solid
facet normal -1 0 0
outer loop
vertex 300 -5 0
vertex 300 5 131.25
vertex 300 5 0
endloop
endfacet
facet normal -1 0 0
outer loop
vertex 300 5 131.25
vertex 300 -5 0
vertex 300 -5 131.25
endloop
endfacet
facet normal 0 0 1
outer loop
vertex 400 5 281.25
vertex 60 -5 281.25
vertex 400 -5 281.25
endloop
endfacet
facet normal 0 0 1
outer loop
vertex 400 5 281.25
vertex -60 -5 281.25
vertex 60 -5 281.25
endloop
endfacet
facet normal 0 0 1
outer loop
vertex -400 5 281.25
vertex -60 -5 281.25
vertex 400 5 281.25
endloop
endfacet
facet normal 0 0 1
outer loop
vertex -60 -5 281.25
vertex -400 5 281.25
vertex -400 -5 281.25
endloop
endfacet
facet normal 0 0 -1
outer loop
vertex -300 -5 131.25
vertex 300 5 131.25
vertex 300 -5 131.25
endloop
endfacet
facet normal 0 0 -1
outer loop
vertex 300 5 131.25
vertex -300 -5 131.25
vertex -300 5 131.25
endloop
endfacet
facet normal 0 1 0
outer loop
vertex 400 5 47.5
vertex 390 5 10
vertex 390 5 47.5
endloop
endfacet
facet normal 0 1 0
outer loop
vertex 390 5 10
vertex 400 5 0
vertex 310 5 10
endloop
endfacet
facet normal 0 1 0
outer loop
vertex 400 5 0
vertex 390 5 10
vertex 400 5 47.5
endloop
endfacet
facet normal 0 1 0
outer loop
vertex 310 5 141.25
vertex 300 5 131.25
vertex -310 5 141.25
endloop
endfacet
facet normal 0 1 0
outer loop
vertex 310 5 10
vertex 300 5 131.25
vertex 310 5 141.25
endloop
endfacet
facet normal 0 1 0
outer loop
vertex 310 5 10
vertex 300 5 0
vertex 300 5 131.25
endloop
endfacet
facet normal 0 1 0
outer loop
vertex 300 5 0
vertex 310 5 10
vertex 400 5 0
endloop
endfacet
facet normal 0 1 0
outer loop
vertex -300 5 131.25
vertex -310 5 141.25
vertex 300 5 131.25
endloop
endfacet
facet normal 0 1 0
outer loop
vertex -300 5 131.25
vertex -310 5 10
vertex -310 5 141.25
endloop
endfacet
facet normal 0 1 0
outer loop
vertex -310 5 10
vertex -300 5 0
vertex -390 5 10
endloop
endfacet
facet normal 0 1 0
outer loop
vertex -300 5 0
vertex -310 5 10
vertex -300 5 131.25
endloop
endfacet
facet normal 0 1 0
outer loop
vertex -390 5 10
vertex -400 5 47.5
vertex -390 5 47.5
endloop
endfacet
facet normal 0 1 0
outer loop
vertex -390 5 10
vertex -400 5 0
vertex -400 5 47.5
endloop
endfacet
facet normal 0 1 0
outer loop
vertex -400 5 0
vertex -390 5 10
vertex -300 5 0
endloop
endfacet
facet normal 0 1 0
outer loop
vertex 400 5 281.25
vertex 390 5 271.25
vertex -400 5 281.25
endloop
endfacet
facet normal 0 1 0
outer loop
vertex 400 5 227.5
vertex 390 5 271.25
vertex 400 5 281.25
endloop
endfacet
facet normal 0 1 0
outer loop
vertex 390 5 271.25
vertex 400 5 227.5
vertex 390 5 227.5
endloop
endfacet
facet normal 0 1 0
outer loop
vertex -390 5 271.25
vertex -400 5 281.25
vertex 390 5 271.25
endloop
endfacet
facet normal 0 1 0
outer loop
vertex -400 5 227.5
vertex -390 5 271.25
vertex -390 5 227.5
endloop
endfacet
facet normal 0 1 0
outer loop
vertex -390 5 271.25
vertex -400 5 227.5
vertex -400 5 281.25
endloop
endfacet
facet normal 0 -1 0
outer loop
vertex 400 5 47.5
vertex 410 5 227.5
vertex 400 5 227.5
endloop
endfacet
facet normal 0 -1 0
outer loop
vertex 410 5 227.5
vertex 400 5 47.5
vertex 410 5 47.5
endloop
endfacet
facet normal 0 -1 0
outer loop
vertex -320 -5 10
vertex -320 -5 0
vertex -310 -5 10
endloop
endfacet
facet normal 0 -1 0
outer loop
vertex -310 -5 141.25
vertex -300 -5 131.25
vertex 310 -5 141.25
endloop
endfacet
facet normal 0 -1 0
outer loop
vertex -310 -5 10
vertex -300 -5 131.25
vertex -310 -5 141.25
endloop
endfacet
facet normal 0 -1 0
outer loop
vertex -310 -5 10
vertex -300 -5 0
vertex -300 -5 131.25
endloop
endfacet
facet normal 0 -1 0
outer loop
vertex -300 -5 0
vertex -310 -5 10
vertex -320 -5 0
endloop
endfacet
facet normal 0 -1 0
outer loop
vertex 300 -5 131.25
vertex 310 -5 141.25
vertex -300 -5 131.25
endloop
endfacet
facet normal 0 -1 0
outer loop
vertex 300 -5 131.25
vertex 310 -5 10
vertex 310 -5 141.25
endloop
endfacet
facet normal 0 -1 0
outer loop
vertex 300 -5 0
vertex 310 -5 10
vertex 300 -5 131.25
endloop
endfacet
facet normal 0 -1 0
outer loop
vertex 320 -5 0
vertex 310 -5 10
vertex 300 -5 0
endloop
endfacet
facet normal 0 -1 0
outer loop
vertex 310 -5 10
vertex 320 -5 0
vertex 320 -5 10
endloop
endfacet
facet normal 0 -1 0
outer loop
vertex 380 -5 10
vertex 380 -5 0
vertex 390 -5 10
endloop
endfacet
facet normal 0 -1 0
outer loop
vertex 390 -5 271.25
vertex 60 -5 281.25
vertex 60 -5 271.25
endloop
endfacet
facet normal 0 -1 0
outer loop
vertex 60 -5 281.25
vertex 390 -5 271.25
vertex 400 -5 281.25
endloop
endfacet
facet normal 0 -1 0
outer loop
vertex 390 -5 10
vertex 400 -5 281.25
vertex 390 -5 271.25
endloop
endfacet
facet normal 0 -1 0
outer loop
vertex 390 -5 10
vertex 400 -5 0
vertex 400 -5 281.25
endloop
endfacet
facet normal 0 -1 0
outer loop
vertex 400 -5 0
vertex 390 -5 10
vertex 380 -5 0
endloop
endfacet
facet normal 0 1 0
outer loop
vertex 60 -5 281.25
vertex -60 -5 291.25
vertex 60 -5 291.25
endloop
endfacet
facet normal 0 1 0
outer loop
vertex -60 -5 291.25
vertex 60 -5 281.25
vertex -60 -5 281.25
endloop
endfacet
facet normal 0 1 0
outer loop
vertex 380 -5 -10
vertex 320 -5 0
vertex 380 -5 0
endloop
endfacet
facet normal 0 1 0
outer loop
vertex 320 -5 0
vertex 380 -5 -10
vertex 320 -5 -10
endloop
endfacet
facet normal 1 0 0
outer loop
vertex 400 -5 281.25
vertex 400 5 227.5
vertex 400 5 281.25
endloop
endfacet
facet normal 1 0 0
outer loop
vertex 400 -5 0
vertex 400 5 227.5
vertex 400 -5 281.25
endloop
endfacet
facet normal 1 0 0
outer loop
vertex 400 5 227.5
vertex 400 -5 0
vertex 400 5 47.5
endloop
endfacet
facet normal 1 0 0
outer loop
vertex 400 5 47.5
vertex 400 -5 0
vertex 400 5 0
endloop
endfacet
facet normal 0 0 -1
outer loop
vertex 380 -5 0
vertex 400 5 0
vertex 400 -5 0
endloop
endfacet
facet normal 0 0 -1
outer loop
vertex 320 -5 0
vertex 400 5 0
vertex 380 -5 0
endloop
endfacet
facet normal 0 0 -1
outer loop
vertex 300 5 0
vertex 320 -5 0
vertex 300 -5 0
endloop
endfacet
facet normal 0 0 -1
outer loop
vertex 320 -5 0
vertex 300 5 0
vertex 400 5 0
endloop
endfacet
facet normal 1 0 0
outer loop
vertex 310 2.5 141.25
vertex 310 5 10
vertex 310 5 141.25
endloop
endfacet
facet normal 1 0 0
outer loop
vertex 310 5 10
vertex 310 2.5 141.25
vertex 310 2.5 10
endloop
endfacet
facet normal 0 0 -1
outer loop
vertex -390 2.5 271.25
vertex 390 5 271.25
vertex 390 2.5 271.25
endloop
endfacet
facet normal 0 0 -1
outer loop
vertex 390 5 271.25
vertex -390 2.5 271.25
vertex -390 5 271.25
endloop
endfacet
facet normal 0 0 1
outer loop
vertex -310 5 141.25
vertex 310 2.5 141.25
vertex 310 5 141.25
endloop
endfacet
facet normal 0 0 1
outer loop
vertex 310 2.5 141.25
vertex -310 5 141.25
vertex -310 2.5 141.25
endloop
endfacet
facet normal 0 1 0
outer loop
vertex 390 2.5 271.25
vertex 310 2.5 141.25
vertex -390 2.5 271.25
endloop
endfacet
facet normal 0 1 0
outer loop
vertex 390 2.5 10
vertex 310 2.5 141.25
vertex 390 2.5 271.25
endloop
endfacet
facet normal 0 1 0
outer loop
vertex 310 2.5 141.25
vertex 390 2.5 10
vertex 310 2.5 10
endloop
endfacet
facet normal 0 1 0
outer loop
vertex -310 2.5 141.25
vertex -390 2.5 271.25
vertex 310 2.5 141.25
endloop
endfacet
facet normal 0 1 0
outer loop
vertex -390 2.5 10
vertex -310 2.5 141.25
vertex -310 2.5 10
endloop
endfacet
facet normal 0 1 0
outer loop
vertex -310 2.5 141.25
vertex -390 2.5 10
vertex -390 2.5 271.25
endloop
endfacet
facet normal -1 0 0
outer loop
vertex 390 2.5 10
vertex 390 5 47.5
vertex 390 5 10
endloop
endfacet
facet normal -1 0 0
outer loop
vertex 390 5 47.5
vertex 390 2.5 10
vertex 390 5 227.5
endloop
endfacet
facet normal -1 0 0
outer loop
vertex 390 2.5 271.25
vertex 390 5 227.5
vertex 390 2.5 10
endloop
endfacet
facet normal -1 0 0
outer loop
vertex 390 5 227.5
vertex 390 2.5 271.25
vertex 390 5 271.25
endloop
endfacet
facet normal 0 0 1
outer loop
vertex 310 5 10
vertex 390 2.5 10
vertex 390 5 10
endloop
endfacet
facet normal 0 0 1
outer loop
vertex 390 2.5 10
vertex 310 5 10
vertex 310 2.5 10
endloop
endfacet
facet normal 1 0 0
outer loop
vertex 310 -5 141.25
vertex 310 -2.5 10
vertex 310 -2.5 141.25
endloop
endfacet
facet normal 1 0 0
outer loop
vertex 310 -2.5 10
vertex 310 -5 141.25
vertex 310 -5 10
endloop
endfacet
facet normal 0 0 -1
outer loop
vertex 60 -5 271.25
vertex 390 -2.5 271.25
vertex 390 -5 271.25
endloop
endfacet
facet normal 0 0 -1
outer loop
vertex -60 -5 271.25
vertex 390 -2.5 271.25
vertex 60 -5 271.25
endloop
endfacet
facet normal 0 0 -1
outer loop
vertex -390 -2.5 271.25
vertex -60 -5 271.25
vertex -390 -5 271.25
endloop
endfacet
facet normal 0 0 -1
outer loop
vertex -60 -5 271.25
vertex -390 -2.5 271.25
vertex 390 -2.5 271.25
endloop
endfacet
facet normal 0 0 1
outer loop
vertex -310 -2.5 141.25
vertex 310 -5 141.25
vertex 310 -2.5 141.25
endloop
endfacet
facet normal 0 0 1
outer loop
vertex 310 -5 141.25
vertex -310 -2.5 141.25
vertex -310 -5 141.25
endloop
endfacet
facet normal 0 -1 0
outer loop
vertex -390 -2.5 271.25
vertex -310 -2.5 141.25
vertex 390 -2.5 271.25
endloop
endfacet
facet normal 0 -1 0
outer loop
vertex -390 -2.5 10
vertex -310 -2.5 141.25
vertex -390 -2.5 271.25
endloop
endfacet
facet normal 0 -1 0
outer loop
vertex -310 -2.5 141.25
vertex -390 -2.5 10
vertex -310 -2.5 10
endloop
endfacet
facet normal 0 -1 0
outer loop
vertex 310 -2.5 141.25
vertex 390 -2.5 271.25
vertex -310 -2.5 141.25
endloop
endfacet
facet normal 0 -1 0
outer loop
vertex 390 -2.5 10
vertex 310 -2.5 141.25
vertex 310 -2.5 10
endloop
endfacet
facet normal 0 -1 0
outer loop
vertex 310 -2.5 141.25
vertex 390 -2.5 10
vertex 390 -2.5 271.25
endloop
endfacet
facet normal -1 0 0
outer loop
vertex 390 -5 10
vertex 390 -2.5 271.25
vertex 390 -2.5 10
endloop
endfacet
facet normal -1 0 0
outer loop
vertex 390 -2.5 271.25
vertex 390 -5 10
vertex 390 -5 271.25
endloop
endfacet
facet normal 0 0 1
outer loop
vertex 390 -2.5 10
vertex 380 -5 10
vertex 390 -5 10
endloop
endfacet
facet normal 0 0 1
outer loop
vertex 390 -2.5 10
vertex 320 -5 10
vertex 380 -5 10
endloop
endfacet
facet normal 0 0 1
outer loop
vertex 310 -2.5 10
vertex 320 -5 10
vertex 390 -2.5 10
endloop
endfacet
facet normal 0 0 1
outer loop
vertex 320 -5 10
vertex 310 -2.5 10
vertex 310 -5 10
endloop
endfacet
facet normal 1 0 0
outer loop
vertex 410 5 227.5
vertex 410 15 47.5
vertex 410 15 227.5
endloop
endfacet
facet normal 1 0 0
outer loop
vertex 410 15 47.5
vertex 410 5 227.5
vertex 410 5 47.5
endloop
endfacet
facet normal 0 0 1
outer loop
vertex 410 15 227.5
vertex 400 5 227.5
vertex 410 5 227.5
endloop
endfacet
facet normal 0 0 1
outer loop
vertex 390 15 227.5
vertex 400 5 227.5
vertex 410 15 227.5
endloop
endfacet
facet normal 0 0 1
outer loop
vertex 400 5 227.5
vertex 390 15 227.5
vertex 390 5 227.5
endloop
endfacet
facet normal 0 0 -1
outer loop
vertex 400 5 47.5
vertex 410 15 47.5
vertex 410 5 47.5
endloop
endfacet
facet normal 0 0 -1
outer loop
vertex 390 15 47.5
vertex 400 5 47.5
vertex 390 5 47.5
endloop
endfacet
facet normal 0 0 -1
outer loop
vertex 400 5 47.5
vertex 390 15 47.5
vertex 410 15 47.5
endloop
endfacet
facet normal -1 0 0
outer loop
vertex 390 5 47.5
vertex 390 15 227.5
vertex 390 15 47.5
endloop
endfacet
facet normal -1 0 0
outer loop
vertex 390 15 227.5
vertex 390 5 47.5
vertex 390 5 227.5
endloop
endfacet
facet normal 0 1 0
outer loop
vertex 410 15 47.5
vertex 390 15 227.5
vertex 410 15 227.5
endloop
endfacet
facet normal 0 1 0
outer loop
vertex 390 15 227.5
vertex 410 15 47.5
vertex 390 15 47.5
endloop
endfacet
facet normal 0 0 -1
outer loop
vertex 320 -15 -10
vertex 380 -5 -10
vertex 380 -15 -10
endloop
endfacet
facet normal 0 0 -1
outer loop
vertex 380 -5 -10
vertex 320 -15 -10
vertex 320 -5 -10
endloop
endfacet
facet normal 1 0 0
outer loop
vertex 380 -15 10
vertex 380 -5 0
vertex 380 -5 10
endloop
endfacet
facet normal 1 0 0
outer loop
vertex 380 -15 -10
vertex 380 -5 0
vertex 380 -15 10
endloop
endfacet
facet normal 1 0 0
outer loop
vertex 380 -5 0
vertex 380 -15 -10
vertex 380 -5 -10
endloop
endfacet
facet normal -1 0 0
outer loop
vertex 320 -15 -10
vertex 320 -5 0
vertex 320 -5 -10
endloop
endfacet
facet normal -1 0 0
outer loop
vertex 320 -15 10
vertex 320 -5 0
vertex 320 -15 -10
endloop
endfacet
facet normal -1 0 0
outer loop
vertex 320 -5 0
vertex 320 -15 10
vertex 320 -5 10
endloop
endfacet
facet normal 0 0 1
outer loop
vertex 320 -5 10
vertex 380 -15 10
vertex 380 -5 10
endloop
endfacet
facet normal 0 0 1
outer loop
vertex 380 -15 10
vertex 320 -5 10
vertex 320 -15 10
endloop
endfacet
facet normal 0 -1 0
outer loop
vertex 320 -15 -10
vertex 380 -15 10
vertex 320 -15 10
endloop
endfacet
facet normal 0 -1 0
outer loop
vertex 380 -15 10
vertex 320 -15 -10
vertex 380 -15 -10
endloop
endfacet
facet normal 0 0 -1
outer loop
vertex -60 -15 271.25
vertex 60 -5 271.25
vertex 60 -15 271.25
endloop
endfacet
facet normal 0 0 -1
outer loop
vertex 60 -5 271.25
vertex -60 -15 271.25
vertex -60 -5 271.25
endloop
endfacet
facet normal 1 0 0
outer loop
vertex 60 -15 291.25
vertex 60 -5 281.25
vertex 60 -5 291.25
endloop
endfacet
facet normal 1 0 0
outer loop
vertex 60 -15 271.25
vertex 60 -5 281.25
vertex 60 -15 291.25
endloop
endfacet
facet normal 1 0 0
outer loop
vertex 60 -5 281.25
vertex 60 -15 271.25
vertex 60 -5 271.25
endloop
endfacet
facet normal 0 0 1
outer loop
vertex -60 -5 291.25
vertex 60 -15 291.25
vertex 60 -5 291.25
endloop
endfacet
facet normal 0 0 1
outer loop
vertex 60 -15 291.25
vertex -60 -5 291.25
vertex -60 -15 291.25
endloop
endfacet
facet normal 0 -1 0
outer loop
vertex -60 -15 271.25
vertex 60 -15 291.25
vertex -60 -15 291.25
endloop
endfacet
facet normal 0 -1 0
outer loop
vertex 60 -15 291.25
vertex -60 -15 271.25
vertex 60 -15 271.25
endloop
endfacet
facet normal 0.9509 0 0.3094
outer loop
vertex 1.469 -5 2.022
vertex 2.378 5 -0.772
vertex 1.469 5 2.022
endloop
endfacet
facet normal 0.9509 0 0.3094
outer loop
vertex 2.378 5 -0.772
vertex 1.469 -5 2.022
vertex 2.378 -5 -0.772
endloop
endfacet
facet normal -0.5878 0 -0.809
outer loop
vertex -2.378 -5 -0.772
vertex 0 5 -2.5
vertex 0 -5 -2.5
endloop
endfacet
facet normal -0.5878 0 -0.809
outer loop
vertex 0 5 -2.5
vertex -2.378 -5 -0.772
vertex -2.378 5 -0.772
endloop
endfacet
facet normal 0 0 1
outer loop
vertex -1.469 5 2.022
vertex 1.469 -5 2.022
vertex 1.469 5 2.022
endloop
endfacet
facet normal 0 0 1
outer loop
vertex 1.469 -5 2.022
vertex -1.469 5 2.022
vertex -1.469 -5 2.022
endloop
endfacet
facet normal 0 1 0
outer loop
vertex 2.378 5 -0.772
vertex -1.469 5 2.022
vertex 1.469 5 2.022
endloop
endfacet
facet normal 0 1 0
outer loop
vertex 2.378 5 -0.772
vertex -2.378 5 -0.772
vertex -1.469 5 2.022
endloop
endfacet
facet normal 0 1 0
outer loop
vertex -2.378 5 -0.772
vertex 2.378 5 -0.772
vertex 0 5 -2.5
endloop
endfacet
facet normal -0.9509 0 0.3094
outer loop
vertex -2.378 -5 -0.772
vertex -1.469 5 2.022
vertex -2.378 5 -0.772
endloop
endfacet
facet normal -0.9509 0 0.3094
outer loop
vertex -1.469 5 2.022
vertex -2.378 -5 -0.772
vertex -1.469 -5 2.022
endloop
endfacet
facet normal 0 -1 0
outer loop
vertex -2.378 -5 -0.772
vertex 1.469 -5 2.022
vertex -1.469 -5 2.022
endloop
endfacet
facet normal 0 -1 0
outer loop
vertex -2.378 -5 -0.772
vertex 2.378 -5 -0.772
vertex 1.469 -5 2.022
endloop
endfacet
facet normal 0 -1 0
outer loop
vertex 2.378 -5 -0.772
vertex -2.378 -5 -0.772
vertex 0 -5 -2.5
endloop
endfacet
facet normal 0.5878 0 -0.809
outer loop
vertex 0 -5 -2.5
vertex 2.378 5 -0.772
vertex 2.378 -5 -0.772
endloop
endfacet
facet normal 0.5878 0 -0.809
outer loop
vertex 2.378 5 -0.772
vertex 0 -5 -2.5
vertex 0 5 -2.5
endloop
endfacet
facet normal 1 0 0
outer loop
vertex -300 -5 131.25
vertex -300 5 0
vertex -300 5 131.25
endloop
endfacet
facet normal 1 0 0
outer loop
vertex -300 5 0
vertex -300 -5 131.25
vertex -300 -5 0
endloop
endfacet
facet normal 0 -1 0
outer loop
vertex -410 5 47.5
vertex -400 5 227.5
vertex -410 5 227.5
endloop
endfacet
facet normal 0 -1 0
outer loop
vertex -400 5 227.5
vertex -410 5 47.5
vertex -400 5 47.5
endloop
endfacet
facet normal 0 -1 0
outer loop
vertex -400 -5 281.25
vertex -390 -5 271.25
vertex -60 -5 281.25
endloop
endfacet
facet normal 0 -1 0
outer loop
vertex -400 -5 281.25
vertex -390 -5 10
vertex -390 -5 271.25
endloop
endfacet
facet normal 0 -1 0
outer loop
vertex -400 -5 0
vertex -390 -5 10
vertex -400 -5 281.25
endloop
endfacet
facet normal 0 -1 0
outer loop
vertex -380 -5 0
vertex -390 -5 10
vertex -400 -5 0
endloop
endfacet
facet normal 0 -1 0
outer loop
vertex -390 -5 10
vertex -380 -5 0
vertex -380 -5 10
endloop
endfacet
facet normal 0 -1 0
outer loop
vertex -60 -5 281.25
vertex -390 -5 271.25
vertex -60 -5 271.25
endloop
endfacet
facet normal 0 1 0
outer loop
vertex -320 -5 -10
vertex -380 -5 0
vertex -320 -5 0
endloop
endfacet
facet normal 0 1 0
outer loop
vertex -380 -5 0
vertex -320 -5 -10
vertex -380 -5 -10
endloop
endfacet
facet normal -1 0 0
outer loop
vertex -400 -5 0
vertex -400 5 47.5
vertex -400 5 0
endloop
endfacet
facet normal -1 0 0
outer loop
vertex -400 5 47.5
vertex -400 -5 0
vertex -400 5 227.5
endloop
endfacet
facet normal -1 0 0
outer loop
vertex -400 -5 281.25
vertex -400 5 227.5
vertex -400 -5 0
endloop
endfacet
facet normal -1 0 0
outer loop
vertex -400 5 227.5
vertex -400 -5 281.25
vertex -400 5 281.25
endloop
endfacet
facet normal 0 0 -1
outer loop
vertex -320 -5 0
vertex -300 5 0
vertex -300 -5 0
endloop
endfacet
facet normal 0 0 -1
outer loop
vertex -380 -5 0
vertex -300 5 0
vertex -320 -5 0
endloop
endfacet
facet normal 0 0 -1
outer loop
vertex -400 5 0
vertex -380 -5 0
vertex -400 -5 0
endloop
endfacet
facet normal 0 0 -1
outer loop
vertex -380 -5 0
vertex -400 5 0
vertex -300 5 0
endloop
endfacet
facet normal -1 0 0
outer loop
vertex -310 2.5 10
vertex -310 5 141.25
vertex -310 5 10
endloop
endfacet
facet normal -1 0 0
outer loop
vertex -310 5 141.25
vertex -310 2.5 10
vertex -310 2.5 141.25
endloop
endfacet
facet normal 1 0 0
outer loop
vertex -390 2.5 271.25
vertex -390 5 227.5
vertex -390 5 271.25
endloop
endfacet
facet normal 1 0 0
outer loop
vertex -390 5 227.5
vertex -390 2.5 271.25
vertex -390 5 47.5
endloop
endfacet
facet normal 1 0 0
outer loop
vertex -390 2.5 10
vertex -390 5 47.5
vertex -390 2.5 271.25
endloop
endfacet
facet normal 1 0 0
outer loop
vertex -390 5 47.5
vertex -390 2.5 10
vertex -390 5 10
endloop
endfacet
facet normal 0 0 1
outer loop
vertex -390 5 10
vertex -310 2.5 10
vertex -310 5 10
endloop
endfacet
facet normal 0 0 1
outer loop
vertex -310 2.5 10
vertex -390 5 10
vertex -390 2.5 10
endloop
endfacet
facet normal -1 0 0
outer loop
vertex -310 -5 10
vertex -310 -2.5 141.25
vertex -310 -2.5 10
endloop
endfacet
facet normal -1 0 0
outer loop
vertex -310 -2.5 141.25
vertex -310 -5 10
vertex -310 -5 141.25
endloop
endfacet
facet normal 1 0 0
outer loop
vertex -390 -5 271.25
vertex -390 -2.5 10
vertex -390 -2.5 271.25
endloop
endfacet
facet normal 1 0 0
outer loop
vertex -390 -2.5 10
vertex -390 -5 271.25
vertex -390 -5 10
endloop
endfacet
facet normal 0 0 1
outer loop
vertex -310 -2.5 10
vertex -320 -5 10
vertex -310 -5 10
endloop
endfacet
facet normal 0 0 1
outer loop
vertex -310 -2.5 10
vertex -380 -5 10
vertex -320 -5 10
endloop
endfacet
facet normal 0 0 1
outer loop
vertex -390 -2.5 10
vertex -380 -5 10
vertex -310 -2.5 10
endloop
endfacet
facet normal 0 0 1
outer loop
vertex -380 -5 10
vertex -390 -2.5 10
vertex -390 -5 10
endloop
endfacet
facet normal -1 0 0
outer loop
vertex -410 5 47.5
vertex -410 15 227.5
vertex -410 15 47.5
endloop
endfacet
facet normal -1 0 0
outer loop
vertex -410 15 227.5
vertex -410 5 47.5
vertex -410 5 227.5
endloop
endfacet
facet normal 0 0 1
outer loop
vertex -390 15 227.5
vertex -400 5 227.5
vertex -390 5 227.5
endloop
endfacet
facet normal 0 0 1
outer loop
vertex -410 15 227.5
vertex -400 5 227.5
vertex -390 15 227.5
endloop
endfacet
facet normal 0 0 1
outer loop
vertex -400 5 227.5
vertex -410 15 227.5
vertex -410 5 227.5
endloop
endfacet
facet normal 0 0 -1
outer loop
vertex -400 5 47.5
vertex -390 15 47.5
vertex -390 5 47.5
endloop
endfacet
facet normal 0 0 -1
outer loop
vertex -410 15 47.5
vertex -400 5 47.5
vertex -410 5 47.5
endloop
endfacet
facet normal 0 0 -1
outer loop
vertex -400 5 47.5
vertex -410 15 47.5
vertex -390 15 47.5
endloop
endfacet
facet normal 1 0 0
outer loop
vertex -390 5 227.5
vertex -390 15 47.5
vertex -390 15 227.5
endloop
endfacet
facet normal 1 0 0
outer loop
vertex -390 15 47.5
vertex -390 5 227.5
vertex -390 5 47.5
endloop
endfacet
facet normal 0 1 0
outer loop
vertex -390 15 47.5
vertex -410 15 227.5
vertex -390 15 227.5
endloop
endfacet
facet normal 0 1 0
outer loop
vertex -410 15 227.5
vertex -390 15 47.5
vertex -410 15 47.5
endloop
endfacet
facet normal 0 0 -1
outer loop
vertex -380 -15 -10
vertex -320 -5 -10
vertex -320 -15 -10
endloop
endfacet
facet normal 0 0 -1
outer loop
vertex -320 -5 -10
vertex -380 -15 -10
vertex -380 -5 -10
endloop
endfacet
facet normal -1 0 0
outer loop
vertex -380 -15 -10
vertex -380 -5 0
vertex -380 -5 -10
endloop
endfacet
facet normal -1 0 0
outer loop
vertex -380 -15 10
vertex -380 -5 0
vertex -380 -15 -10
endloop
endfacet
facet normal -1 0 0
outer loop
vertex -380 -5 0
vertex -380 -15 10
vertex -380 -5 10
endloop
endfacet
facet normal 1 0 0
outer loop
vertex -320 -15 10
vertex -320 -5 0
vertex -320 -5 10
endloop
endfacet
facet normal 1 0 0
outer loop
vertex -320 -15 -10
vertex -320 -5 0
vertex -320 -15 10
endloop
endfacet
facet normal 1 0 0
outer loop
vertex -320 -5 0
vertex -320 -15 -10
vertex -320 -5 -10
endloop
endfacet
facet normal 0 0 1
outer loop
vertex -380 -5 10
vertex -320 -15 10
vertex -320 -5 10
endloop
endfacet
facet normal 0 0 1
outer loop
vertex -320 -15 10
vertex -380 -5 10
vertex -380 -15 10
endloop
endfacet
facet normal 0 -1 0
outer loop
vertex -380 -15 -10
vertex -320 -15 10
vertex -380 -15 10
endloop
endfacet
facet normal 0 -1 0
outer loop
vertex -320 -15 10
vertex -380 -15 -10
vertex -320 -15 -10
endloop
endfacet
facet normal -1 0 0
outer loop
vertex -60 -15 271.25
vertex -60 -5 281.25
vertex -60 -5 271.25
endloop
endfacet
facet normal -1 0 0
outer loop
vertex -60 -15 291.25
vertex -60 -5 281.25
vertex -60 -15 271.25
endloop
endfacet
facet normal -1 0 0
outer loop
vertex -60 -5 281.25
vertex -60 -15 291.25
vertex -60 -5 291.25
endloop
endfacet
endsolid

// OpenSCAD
t = 1/10; // thickness unit
h = 45/16; // height
lw = 9/8; // leg-width
bh = 3/2; // bridge height
bo = h - bh; // bridge-vertical offset

in2mm = 100;

module Lip() {
  cube([2*t, t, 6*t], center=true);
}

module Holes() {
  rotate([0, 90, 90]) cylinder(h=t, r=t/4, center=true);
}

module Cutaway() {
  color("tan") {
    translate([0, t/4, bo + t]) cube([3 + t, t, bh - 2*t]);
    translate([3 + t, t/4, t]) cube([1 - 2*t, t, h - 2*t]);
  }
}

module HalfCover() {
  Holes();
  difference() {
    union() {
      translate([0, -t/2, bo]) cube([3, t, bh]);
      translate([3, -t/2, 0]) cube([1, t, h]);
    }
    Cutaway();
    mirror([0, 90, 0]) Cutaway();
  }
  color("green") {
    translate([4, t, 11/8]) scale([1, 1, 3]) Lip();
    translate([3.5, -t, 0]) rotate([0, 90, 0]) Lip();
    translate([3*t, -t, h]) rotate([0, 90, 0]) Lip();
  }
}

scale([in2mm, in2mm, in2mm]) {
  union() {
    HalfCover();
    mirror([90, 0, 0]) HalfCover();
  }
}
